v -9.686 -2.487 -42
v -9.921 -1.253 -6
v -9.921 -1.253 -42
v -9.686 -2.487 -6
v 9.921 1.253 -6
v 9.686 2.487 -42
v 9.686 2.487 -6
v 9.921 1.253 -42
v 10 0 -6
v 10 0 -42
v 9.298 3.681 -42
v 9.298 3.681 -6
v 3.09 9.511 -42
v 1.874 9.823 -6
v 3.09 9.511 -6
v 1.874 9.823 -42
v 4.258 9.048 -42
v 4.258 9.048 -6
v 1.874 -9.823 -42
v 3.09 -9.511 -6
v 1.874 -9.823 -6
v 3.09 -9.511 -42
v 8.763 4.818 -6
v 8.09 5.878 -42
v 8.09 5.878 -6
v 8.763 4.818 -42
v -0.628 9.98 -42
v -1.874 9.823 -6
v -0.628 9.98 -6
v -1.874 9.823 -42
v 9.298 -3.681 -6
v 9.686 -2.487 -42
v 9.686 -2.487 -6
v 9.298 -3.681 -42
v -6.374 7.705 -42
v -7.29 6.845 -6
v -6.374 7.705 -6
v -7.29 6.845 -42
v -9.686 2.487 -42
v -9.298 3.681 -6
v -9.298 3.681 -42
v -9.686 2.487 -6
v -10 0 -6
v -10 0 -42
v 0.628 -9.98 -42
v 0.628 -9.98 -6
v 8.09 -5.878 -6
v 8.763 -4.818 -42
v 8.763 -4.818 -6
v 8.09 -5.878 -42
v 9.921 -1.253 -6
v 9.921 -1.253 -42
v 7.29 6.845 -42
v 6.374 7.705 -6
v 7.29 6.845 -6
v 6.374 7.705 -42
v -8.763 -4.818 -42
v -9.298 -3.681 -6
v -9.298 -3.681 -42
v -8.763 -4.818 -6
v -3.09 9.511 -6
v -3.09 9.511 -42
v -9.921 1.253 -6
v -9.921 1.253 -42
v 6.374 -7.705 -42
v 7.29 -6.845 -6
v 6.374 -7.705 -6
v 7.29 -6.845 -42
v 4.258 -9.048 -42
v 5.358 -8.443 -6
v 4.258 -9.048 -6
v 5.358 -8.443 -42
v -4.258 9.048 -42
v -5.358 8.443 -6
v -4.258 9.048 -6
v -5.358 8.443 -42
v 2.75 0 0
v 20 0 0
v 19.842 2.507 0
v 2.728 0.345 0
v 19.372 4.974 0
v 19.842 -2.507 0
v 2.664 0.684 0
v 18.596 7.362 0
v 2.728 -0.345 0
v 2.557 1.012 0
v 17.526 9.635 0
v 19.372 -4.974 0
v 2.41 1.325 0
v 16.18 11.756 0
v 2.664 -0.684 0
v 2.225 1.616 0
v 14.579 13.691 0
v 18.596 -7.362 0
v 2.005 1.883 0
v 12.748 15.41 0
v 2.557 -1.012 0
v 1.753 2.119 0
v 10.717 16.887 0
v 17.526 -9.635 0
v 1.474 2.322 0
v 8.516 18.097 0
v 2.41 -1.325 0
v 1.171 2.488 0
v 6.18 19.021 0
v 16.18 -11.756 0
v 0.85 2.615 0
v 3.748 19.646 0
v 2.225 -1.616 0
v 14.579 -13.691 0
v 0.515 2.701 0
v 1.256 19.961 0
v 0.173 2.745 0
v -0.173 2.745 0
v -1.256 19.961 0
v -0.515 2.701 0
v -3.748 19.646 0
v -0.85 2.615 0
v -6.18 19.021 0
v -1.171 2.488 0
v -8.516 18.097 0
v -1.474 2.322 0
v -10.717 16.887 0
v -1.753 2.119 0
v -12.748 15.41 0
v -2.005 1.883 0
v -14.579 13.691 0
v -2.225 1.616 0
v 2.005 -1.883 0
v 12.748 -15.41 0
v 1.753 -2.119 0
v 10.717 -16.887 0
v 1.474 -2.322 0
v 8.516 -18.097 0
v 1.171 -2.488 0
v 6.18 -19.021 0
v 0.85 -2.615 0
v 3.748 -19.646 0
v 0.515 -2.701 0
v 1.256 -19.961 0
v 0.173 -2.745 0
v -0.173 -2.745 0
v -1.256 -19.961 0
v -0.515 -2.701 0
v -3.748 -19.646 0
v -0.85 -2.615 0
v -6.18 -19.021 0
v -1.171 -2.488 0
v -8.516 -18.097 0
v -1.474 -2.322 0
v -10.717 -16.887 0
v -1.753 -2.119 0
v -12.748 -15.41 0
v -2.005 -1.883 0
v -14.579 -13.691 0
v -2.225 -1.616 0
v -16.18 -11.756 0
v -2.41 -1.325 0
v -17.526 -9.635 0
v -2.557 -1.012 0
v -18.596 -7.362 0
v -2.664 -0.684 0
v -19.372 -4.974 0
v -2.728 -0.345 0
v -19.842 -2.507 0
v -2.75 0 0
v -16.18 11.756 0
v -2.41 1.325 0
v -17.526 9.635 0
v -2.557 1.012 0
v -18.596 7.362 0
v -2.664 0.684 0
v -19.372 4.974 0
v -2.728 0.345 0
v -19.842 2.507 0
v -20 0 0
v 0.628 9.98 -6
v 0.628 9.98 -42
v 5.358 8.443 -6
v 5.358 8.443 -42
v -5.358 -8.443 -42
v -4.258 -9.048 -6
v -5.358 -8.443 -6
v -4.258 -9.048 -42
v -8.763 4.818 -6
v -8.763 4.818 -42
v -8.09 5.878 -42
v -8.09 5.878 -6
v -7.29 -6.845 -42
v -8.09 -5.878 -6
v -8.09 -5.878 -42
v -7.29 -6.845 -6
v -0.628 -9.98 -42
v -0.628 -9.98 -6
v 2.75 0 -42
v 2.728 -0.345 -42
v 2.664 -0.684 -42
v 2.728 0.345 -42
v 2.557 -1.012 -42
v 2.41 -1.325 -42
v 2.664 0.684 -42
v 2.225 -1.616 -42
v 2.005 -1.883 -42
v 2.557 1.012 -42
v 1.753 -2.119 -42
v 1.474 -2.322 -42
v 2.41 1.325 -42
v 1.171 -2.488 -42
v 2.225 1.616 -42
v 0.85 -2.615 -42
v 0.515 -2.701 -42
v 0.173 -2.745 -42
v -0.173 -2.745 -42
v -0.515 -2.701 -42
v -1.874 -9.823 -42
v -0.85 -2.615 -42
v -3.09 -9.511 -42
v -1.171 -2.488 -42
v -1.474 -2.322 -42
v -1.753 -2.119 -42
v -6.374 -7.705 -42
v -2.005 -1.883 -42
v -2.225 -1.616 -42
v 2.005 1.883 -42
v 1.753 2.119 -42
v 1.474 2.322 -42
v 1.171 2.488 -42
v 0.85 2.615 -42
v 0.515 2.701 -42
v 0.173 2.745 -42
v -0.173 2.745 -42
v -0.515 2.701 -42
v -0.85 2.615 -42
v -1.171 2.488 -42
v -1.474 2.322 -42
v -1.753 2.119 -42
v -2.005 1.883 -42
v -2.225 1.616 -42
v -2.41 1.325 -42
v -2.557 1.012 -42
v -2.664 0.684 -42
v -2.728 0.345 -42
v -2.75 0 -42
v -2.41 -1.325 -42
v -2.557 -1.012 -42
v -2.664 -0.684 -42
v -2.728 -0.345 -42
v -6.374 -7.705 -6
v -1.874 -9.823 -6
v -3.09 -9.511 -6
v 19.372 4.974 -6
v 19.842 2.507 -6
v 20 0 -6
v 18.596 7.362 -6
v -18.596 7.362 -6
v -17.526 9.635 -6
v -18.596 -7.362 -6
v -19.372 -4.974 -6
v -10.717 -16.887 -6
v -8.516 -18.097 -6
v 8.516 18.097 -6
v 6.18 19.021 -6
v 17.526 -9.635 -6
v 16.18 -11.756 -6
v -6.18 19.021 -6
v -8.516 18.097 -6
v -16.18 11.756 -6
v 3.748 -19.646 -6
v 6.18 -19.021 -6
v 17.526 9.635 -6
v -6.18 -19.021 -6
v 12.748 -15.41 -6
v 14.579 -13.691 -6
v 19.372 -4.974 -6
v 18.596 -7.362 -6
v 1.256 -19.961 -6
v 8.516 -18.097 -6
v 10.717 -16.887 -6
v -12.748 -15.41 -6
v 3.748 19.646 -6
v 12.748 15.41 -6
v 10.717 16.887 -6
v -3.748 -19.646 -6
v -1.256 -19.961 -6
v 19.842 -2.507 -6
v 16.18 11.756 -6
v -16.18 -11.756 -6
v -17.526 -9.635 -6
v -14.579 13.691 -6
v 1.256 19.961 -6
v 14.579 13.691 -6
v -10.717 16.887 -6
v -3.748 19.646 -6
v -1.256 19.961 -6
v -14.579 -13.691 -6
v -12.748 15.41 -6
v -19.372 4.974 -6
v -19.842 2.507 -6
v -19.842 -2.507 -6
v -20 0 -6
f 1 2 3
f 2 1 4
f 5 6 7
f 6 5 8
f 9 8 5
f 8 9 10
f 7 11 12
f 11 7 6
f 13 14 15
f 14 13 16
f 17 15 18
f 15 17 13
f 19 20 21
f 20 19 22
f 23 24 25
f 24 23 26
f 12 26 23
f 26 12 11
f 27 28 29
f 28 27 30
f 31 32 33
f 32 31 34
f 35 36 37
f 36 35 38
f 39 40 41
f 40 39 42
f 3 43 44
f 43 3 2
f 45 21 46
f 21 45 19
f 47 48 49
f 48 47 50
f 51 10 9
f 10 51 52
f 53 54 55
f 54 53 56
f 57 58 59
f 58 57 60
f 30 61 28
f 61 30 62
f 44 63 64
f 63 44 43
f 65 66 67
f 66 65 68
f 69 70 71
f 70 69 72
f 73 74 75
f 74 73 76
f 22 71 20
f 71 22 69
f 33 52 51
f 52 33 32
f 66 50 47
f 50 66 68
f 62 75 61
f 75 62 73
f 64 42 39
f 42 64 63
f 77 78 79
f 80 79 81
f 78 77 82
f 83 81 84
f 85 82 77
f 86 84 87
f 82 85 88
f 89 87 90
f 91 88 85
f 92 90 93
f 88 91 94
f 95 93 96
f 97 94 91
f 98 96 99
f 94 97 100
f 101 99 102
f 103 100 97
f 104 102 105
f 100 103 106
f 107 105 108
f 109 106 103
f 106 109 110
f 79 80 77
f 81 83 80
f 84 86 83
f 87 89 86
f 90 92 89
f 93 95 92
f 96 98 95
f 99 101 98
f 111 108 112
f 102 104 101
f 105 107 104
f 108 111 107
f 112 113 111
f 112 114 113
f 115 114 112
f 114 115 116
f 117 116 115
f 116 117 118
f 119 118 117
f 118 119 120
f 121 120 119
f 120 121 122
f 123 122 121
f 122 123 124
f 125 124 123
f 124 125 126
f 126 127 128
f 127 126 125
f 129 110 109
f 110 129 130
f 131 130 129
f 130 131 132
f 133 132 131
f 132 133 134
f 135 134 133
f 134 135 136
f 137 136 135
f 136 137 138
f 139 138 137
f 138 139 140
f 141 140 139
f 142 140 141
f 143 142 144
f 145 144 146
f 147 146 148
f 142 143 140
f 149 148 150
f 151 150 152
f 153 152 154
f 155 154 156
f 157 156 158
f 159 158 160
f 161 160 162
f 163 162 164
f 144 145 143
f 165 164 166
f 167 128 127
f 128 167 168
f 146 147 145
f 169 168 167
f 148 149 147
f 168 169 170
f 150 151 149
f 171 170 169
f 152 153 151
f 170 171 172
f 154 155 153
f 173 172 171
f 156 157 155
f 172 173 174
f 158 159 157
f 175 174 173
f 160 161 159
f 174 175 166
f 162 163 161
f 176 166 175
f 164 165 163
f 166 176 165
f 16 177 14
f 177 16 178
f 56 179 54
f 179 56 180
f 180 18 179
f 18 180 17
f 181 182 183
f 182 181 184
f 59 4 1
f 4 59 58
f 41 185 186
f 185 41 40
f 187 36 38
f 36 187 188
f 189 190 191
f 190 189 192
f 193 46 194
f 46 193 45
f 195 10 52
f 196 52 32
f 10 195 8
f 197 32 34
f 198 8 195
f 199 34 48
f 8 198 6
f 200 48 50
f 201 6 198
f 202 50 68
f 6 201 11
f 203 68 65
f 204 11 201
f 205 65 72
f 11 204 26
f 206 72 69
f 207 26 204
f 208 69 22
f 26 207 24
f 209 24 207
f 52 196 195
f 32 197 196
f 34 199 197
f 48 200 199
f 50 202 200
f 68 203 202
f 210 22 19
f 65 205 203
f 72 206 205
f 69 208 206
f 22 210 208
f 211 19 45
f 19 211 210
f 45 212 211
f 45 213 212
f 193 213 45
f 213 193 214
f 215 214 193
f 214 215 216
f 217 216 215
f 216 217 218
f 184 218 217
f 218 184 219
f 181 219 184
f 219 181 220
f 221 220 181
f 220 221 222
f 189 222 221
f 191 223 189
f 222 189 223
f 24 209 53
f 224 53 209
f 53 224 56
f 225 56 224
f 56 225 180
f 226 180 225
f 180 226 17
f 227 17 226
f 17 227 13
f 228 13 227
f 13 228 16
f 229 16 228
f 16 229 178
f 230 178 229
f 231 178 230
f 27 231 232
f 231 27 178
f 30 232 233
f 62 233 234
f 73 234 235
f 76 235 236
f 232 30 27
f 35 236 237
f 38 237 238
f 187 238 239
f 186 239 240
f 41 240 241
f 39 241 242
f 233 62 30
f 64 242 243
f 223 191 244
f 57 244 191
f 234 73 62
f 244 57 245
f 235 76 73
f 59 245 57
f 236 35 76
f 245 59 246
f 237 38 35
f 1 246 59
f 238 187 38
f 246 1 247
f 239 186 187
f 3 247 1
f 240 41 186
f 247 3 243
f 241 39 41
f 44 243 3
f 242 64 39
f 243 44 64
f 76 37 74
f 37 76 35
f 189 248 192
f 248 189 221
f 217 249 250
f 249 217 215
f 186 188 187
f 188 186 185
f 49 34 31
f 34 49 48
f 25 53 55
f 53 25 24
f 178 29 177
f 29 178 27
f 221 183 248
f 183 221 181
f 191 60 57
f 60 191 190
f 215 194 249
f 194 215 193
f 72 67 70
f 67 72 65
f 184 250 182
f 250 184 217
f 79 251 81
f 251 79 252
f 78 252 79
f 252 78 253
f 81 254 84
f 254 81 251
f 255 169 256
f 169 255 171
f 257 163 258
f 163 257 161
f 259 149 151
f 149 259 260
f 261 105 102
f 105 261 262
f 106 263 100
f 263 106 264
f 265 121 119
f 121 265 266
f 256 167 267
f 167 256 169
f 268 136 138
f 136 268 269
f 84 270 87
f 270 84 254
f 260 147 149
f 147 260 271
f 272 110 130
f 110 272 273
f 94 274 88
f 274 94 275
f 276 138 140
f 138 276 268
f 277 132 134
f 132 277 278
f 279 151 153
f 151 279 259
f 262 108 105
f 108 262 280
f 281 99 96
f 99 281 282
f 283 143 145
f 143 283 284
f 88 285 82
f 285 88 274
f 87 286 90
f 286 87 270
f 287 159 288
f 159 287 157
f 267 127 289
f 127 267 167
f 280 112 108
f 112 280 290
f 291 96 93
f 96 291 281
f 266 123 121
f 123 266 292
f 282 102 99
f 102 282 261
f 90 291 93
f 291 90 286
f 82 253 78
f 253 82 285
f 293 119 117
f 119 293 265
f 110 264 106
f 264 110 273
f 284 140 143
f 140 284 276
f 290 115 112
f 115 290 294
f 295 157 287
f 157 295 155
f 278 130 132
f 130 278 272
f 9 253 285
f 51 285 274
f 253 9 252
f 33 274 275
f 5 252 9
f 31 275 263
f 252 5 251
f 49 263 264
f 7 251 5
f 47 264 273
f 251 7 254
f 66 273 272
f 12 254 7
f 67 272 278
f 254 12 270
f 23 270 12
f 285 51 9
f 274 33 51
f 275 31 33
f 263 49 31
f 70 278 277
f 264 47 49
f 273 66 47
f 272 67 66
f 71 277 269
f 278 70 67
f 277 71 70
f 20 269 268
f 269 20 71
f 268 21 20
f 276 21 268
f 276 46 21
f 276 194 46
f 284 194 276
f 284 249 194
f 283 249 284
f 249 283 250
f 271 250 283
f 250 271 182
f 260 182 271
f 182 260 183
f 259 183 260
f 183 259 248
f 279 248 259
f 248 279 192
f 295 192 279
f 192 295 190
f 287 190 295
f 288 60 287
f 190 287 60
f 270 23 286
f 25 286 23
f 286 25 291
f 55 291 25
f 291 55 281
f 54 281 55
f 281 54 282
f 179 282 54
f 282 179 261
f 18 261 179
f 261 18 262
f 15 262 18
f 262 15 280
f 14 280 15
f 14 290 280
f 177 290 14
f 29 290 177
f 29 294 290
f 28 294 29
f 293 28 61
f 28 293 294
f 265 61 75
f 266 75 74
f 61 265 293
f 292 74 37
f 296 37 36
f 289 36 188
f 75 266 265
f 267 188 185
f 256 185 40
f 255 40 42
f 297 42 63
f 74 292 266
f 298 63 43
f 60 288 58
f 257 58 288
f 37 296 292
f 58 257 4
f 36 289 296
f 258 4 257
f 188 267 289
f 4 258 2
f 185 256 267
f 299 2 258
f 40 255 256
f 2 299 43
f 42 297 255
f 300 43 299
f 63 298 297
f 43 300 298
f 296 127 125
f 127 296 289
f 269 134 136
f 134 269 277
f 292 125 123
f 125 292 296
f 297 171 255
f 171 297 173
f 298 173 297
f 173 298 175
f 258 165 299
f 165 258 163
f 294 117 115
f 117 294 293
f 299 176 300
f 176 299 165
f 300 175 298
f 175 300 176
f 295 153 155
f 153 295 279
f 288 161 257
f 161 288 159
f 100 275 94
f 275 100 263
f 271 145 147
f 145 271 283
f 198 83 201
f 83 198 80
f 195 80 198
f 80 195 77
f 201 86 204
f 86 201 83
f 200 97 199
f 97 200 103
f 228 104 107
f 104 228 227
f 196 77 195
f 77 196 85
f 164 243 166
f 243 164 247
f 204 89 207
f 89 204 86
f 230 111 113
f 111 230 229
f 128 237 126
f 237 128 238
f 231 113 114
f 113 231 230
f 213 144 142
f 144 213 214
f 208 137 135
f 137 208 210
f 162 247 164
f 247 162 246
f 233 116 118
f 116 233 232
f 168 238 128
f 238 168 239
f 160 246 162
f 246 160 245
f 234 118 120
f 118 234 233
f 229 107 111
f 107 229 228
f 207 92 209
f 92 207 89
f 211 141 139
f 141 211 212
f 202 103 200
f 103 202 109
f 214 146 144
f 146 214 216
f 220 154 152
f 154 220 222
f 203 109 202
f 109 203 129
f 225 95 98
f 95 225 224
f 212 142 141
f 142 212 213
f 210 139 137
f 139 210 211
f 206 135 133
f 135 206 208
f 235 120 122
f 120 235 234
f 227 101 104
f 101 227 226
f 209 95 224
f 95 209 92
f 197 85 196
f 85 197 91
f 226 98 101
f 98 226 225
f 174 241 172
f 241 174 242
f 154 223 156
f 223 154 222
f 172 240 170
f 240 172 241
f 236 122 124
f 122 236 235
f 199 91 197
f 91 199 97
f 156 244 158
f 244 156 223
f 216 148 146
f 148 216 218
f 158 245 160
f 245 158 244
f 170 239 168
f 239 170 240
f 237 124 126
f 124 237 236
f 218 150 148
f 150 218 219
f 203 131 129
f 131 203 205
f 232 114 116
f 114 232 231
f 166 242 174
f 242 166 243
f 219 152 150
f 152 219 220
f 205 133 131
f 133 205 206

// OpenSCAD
$fn = 50;


difference() {
	union() {
		translate(v = [0, 0, -42.0000000000]) {
			cylinder(h = 42, r = 10.0000000000);
		}
		translate(v = [0, 0, -6.0000000000]) {
			cylinder(h = 6, r = 20.0000000000);
		}
	}
	union() {
		#translate(v = [0, 0, -42]) {
			cylinder(h = 42, r = 2.7500000000);
		}
	}
}
